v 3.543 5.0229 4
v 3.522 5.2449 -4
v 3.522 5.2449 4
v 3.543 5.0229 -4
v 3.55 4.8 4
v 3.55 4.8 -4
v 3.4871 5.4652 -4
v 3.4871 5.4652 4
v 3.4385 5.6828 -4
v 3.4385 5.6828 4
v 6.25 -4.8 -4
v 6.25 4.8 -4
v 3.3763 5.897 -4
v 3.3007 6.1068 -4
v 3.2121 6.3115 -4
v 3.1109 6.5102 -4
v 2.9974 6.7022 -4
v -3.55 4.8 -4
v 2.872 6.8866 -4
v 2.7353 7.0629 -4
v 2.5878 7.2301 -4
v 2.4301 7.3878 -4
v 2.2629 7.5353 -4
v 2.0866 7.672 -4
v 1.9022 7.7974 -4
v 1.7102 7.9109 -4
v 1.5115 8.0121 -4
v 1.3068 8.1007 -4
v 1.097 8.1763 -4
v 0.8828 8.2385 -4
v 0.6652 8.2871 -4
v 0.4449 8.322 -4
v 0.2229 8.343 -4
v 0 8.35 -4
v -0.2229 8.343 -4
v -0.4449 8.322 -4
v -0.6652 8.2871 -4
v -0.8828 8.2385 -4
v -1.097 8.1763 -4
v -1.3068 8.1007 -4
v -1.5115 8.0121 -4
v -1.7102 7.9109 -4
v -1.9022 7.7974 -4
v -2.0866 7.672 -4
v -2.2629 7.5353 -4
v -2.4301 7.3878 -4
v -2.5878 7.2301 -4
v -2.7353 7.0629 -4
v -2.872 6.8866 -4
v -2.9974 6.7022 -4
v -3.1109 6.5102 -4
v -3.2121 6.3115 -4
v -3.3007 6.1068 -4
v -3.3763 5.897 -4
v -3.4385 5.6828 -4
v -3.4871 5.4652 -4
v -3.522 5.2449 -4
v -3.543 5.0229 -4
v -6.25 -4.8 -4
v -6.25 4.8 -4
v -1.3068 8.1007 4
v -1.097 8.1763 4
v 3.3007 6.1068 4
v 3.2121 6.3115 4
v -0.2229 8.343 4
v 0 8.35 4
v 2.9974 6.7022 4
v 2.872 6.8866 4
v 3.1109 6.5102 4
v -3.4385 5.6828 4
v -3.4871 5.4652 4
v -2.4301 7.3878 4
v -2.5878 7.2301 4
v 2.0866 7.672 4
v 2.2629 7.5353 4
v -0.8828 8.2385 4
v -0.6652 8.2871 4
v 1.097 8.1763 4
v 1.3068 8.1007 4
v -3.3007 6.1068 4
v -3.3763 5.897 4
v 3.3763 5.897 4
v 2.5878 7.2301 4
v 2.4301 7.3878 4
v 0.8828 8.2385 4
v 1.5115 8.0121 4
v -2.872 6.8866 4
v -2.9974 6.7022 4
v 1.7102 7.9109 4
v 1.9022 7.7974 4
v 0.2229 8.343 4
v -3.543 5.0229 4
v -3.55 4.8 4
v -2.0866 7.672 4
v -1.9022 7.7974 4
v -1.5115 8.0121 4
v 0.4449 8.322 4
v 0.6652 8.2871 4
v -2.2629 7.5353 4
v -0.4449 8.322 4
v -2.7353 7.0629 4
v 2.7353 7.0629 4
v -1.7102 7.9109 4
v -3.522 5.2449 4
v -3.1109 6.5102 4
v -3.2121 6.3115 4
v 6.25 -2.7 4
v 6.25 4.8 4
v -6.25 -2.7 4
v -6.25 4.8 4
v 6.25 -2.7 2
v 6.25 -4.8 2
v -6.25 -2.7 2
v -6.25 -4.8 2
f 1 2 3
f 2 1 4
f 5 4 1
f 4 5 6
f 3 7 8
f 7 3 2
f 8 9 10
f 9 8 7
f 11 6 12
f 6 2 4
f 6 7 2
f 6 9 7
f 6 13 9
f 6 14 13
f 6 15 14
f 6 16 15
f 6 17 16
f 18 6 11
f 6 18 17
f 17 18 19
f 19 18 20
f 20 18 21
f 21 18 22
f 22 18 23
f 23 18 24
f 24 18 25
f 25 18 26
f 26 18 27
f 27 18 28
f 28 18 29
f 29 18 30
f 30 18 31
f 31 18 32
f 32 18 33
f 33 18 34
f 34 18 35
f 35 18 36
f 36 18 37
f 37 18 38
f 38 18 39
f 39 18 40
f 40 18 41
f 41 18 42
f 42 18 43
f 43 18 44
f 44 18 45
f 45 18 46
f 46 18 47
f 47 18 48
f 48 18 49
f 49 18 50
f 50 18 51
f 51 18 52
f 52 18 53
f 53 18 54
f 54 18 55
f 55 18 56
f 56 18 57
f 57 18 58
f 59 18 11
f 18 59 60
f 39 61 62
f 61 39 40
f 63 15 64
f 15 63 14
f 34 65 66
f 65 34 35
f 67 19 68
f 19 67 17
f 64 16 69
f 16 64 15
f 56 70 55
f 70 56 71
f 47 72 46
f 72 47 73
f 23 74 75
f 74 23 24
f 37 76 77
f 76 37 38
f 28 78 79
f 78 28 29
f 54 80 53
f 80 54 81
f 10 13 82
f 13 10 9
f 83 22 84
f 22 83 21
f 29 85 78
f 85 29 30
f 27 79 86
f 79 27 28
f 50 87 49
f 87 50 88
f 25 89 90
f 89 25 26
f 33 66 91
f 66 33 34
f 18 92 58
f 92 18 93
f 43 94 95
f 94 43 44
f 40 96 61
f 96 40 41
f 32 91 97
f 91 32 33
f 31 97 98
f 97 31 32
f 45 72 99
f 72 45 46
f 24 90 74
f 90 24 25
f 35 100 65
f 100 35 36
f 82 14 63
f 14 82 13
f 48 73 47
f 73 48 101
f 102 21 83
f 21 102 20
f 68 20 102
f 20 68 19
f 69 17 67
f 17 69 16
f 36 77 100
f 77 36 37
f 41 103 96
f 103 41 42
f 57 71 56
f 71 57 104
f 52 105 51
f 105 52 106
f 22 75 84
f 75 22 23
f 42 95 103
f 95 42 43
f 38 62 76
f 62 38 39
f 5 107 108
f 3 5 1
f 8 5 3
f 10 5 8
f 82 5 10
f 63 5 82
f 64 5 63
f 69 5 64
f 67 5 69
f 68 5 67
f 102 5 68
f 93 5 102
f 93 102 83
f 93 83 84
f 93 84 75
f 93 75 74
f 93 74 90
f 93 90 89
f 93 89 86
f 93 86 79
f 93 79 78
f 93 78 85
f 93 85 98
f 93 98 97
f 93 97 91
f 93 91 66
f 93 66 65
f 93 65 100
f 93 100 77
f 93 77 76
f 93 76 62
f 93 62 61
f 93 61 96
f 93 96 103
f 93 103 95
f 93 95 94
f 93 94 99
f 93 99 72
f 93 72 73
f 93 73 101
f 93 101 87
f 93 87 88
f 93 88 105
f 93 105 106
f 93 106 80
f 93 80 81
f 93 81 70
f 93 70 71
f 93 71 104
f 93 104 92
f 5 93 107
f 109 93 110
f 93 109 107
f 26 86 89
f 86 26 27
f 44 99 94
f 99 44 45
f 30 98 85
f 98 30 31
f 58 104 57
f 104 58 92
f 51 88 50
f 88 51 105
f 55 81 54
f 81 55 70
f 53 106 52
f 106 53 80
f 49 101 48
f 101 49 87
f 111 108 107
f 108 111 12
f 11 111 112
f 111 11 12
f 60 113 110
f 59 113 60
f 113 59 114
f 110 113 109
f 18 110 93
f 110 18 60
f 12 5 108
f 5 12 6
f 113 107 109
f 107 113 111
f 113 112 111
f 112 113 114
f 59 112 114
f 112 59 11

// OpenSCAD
wall_thickness = 0.4;

width = 11.7 + wall_thickness*2;
height1 = 6.7 + wall_thickness*2;
height2 = 8.8 + wall_thickness*2;
depth = 8;

clip_width = 6.3 + wall_thickness*2;

translate([0,(height2/2),0]) cylinder(r=(clip_width/2), h=depth, center=true, $fn=100);

translate([0,(height2-height1)/2,0]) cube([width,height1,depth],center=true);

taper = 2;
thick_height = depth-taper;

translate([0,0,-taper/2]) cube([width,height2,thick_height],center=true);

taper_start_z = depth/2 - taper;
taper_depth = (height2 - height1)*2;
polyhedron(
    points=[
        [-width/2,-(height2-taper_depth)/2,taper_start_z],
        [-width/2,-(height2)/2,taper_start_z],
        [width/2,-(height2)/2,taper_start_z],
        [width/2,-(height2-taper_depth)/2,taper_start_z],
        [width/2,-(height2-taper_depth)/2,depth/2],
        [-width/2,-(height2-taper_depth)/2,depth/2],
        ],
    faces=[
        [0,1,2,3],
        [0,3,4,5],
        [1,2,4,5],
        [0,1,5],
        [2,3,4],
        ]
    );
